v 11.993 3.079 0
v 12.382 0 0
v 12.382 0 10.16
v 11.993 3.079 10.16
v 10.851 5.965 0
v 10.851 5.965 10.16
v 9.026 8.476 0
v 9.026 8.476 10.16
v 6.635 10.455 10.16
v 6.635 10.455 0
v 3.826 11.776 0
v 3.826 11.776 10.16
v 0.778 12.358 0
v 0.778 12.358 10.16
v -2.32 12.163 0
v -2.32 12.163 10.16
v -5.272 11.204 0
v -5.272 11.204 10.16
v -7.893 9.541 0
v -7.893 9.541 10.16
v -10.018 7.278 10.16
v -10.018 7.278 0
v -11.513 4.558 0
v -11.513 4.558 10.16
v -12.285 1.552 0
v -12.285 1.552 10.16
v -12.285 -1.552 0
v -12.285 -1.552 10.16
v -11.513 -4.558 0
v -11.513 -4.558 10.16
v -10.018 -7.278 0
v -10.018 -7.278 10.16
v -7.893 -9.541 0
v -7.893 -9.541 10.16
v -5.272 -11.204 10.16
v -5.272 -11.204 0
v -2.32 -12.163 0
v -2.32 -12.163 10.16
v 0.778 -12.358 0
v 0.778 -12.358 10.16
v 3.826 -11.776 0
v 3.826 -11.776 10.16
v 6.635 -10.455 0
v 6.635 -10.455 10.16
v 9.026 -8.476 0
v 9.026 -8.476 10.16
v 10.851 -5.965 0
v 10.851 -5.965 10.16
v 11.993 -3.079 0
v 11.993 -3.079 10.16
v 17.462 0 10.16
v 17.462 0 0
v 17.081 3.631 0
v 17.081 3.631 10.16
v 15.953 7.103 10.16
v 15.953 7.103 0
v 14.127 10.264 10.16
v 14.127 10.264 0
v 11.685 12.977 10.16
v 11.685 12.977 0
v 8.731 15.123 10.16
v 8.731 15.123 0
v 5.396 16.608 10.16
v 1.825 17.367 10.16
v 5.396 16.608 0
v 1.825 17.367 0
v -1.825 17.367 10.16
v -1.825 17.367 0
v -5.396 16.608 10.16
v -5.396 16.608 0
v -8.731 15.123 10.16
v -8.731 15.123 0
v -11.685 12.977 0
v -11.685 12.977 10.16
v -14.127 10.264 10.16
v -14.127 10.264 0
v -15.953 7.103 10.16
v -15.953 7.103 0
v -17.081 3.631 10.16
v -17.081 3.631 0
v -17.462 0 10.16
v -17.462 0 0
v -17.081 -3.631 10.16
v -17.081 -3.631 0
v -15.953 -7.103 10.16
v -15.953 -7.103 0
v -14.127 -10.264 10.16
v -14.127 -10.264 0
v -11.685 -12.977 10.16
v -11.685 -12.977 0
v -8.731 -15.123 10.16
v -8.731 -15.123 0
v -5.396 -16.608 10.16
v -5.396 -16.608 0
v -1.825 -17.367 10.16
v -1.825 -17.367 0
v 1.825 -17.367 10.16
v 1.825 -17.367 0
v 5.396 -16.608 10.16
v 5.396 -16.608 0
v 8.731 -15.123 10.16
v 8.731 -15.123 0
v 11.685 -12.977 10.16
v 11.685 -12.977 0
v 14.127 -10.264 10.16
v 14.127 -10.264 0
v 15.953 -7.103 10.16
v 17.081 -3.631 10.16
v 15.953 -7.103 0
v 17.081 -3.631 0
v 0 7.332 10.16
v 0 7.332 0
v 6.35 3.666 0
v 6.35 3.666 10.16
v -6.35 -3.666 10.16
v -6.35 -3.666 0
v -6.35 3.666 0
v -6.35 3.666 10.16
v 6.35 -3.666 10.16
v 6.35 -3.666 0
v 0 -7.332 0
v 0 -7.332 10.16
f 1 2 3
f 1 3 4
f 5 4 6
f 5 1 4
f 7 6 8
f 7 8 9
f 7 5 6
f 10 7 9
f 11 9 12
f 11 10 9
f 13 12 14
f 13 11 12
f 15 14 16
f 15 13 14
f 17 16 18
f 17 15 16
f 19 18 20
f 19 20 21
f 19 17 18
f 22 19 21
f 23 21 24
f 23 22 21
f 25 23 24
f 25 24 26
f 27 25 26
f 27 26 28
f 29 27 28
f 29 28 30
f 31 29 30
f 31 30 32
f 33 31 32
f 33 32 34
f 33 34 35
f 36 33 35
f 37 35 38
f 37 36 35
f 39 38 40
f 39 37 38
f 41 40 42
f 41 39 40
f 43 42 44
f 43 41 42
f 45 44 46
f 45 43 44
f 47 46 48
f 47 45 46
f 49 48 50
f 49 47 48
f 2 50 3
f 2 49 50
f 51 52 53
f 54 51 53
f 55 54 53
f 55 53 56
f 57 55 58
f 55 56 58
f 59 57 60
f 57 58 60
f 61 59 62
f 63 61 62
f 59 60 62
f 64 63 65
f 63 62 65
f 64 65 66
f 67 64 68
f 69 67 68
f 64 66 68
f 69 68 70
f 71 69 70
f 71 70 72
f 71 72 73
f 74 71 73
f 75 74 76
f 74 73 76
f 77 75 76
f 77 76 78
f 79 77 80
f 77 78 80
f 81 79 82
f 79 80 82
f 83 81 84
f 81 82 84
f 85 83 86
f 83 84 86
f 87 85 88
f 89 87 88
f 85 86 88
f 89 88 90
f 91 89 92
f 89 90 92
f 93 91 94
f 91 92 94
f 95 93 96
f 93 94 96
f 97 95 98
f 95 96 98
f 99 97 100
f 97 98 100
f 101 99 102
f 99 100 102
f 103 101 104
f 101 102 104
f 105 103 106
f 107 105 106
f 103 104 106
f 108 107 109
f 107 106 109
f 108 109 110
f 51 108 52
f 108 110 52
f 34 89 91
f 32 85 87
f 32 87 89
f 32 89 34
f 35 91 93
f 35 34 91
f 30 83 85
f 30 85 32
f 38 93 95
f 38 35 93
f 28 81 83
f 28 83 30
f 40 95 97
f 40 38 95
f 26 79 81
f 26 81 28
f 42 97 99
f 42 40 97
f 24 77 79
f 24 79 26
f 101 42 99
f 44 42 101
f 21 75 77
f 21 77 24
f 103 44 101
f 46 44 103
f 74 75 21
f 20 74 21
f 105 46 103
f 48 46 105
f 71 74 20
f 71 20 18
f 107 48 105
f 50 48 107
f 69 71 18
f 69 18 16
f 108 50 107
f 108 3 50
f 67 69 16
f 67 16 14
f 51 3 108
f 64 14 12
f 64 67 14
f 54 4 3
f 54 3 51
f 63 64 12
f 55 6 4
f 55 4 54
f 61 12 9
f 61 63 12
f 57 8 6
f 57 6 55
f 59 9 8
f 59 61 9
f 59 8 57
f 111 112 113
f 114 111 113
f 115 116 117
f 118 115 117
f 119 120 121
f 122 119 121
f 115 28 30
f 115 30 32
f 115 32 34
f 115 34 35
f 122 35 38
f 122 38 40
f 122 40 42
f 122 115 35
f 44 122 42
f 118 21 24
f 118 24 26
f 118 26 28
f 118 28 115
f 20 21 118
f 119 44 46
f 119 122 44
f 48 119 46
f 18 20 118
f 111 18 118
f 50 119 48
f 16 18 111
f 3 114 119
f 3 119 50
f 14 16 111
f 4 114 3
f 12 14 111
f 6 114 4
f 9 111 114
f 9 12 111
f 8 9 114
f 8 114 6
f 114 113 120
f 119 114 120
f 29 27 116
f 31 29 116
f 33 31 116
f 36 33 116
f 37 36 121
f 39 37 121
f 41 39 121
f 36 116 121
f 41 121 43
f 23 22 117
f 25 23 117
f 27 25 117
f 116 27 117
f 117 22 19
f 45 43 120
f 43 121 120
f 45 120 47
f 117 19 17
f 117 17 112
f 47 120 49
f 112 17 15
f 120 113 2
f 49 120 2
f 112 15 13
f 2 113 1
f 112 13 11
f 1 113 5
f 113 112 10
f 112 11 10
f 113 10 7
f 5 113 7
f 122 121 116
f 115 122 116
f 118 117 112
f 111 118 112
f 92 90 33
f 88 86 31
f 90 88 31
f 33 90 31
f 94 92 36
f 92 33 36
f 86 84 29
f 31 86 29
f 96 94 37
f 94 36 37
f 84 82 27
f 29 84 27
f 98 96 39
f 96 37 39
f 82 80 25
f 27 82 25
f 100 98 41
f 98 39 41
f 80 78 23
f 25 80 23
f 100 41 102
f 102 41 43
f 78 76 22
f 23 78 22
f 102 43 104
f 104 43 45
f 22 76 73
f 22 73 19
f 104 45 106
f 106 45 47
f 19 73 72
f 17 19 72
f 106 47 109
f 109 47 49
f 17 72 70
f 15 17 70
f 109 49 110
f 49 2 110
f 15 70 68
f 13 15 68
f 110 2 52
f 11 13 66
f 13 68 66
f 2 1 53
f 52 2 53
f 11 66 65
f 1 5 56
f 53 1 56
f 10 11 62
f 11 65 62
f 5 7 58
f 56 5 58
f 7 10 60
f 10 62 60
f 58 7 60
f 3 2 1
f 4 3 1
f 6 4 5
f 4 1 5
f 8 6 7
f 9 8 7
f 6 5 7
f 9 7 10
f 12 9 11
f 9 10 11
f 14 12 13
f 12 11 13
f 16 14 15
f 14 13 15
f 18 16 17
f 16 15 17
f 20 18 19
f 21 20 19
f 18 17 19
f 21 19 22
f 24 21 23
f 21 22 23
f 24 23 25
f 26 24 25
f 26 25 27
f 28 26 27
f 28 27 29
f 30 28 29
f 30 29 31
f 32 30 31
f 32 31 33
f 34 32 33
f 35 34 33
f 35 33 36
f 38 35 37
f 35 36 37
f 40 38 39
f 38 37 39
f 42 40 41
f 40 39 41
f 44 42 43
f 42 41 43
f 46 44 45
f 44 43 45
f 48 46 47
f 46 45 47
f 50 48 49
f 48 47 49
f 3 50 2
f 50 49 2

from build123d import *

# Parameters (mm, degrees)
F0_R     = 17.4625
F0_R_2   = 12.3825
F1_DEPTH = 10.16
F2_R     = 12.3825
F3_DEPTH = 10.16


with BuildPart() as f1:
    # F0 (on Top) → F1 (new body)
    with BuildSketch(Plane.XY):
        Circle(F0_R)
        Circle(F0_R_2, mode=Mode.SUBTRACT)
    extrude(amount=F1_DEPTH)


with BuildPart() as f3:
    # F2 (on Top) → F3 (new body)
    with BuildSketch(Plane.XY):
        Circle(F2_R)
        Polygon((-6.35, 3.666174), (0, 7.332348), (6.35, 3.666174), (6.35, -3.666174), (0, -7.332348), (-6.35, -3.666174), align=None, mode=Mode.SUBTRACT)
    extrude(amount=F3_DEPTH)


solid = Compound([f1.part, f3.part])
